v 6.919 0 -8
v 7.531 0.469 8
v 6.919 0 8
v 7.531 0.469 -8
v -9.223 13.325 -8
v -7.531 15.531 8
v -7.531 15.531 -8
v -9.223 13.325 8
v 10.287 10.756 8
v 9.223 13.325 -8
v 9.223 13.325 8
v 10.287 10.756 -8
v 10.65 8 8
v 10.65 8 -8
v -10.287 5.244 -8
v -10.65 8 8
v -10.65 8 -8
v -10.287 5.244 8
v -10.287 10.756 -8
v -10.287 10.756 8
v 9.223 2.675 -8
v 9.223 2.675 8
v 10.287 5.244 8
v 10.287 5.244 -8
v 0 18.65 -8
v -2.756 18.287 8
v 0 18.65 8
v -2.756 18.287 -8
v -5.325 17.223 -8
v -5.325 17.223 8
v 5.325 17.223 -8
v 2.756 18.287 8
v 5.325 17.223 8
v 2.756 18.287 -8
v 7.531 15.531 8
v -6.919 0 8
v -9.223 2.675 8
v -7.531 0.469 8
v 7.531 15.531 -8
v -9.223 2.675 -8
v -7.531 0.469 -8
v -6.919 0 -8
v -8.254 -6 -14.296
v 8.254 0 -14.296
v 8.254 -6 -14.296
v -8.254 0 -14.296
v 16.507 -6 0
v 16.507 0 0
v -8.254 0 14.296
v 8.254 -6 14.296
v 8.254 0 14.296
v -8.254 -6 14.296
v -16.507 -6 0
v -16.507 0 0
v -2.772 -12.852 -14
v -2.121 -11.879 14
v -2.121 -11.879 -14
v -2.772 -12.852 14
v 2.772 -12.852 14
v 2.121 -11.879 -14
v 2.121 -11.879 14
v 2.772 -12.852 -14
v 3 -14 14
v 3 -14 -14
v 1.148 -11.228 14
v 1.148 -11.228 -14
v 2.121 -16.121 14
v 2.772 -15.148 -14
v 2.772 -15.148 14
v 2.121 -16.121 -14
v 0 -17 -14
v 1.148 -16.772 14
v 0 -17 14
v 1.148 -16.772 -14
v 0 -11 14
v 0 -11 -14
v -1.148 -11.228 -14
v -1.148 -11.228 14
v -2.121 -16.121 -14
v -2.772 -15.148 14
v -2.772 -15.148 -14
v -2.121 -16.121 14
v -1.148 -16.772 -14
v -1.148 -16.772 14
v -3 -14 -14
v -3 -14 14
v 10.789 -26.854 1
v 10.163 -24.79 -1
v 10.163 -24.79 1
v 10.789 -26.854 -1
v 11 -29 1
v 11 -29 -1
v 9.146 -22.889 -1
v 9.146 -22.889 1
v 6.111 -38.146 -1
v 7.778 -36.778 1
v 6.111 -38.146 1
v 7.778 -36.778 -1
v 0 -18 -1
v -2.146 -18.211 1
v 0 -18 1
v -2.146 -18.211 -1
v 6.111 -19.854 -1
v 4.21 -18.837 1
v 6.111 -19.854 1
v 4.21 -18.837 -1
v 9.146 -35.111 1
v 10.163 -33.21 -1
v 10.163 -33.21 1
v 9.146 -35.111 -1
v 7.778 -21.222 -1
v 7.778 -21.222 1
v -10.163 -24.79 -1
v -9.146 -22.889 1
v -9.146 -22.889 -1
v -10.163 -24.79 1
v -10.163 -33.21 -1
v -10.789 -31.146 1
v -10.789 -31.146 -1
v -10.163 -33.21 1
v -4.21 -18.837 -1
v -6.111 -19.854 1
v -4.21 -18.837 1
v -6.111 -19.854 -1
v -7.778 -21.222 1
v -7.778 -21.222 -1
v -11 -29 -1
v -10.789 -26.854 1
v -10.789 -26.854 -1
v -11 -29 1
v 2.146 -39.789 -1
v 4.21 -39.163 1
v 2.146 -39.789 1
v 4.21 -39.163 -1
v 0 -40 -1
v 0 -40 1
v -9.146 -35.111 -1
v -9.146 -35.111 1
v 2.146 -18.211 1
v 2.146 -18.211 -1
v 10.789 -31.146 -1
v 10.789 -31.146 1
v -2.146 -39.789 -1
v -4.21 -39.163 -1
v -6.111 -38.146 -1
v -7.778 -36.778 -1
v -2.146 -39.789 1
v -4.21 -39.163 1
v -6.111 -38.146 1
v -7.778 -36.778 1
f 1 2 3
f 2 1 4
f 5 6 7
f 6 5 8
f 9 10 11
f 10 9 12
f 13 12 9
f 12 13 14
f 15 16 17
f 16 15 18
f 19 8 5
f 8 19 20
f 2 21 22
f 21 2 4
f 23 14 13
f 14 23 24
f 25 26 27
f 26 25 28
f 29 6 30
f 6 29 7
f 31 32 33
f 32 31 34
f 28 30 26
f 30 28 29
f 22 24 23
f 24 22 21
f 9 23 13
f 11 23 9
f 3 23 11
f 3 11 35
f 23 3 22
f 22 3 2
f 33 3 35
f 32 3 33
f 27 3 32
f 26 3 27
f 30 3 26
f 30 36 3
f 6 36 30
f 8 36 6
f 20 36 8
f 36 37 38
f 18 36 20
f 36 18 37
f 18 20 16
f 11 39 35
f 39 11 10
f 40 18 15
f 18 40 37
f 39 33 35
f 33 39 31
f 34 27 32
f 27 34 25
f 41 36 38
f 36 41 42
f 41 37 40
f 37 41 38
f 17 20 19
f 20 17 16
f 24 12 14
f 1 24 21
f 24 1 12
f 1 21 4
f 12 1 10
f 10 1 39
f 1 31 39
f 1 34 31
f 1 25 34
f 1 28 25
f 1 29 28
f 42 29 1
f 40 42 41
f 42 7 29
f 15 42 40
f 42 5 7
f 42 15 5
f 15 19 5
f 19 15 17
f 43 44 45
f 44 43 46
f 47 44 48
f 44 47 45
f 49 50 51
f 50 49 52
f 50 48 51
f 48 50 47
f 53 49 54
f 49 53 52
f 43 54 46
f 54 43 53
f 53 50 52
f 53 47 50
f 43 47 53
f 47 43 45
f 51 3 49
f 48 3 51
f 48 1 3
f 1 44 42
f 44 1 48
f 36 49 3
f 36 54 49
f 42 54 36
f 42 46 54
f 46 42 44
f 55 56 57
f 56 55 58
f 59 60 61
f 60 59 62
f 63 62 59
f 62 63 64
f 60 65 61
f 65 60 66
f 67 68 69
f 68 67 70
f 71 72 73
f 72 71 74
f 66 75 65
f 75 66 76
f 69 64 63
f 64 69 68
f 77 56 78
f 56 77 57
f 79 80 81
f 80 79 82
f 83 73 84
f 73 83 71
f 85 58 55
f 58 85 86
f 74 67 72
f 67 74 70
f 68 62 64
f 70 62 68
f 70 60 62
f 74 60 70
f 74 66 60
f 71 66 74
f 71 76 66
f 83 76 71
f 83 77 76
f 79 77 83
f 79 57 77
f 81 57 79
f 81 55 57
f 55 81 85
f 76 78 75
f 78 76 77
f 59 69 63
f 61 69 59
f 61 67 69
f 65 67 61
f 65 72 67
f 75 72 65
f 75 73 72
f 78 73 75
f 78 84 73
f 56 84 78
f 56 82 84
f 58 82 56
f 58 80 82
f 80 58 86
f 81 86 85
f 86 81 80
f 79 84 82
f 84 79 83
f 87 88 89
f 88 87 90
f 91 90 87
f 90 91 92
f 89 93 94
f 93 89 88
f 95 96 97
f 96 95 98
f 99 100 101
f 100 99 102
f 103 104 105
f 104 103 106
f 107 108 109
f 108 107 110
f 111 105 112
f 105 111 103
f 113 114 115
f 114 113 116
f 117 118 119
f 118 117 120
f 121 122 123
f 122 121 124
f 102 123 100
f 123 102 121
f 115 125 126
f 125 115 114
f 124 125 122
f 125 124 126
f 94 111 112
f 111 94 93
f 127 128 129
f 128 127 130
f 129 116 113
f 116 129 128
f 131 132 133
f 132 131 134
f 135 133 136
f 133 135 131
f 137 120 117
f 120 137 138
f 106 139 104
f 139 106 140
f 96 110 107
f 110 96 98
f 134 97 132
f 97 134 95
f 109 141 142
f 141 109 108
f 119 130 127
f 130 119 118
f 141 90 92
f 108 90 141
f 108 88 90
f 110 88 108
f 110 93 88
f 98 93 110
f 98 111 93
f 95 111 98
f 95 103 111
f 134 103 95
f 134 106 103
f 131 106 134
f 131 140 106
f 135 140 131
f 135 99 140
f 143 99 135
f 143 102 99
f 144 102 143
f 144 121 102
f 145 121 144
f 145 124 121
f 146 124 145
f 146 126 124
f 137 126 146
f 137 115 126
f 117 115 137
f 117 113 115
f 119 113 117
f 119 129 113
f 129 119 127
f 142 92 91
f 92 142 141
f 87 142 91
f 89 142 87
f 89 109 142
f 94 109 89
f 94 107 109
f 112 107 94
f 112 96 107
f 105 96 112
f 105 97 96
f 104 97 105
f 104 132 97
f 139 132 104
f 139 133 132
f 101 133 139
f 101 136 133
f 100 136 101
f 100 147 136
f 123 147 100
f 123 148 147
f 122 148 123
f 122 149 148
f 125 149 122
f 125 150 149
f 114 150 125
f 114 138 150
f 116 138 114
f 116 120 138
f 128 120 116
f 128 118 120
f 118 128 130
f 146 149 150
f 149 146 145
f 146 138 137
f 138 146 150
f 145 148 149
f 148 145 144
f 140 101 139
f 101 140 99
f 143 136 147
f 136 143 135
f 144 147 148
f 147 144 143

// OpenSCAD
// Pendant sprinkler head. Thread up (+Y), deflector below origin.
//
//   inlet: (0, +L/2, 0), dir (0, +1, 0)    — 1/2" NPT male
//
// K-factor is metadata only; geometry is the same visual stand-in.
//
// @part head_pendant
// @kind sprinkler_head
// @category head.pendant.k56
// @display-name "Pendant Sprinkler K5.6 (1/2\" NPT)"
// @mfg tyco
// @mfg-pn TY3251
// @listing UL FM
// @hazard-classes LH OH1 OH2
// @price-usd 22.50
// @install-minutes 5
// @crew journeyman
// @k-factor 5.6
// @orientation pendant
// @response standard
// @temperature 155F
// @param size_in enum[0.5,0.75] default=0.5 label="Size" unit="in"
// @param k_factor enum[5.6,8.0] default=5.6 label="K-Factor"
// @port inlet position=[0,0.014,0] direction=[0,1,0] style=NPT_threaded size_in=0.5 role=drop

size_in = 0.5;
k_factor = 5.6;

thread_od    = 21.3;   // 1/2" NPT
thread_len   = 16;
frame_height = 28;
deflector_d  = 22;

union() {
    // Threaded boss up
    translate([0, thread_len/2, 0])
        cylinder(h = thread_len, d = thread_od, center = true, $fn = 24);
    // Hex wrench flat
    translate([0, -3, 0])
        rotate([90, 0, 0])
        cylinder(h = 6, d = thread_od * 1.55, $fn = 6, center = true);
    // Frame yoke
    translate([0, -frame_height/2, 0])
        cylinder(h = frame_height, d = 6, center = true, $fn = 16);
    // Deflector plate
    translate([0, -frame_height - 1, 0])
        cylinder(h = 2, d = deflector_d, center = true, $fn = 32);
}
